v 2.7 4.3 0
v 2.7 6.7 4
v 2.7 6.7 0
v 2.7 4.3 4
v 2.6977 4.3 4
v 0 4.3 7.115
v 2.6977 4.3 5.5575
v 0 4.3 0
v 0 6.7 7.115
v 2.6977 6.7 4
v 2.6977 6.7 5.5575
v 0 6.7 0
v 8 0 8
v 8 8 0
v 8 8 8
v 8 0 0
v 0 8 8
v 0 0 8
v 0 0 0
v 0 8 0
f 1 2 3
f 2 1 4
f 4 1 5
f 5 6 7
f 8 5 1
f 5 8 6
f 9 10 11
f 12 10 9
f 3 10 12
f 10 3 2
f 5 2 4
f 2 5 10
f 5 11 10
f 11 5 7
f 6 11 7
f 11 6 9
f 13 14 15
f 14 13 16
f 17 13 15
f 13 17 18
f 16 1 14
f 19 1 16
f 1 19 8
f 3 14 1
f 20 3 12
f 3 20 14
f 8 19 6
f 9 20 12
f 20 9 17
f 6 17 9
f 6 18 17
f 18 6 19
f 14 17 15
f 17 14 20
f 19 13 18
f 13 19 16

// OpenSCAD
/*
  When exporting this to STL, null polygons appear, causing
  problems normalizing normal vectors (nan output in STL files)
*/

$fs=0.2;

difference() {
  cube(8);

  translate([0,20,4]) rotate([90,0,0]) union() {
    translate([0,-3,14.5]) cube([5.4,6,2.4],center=true);
    translate([0,0,13.3]) rotate([0,0,30]) cylinder(r=3.115,h=2.4,$fn=6);
  }
}
